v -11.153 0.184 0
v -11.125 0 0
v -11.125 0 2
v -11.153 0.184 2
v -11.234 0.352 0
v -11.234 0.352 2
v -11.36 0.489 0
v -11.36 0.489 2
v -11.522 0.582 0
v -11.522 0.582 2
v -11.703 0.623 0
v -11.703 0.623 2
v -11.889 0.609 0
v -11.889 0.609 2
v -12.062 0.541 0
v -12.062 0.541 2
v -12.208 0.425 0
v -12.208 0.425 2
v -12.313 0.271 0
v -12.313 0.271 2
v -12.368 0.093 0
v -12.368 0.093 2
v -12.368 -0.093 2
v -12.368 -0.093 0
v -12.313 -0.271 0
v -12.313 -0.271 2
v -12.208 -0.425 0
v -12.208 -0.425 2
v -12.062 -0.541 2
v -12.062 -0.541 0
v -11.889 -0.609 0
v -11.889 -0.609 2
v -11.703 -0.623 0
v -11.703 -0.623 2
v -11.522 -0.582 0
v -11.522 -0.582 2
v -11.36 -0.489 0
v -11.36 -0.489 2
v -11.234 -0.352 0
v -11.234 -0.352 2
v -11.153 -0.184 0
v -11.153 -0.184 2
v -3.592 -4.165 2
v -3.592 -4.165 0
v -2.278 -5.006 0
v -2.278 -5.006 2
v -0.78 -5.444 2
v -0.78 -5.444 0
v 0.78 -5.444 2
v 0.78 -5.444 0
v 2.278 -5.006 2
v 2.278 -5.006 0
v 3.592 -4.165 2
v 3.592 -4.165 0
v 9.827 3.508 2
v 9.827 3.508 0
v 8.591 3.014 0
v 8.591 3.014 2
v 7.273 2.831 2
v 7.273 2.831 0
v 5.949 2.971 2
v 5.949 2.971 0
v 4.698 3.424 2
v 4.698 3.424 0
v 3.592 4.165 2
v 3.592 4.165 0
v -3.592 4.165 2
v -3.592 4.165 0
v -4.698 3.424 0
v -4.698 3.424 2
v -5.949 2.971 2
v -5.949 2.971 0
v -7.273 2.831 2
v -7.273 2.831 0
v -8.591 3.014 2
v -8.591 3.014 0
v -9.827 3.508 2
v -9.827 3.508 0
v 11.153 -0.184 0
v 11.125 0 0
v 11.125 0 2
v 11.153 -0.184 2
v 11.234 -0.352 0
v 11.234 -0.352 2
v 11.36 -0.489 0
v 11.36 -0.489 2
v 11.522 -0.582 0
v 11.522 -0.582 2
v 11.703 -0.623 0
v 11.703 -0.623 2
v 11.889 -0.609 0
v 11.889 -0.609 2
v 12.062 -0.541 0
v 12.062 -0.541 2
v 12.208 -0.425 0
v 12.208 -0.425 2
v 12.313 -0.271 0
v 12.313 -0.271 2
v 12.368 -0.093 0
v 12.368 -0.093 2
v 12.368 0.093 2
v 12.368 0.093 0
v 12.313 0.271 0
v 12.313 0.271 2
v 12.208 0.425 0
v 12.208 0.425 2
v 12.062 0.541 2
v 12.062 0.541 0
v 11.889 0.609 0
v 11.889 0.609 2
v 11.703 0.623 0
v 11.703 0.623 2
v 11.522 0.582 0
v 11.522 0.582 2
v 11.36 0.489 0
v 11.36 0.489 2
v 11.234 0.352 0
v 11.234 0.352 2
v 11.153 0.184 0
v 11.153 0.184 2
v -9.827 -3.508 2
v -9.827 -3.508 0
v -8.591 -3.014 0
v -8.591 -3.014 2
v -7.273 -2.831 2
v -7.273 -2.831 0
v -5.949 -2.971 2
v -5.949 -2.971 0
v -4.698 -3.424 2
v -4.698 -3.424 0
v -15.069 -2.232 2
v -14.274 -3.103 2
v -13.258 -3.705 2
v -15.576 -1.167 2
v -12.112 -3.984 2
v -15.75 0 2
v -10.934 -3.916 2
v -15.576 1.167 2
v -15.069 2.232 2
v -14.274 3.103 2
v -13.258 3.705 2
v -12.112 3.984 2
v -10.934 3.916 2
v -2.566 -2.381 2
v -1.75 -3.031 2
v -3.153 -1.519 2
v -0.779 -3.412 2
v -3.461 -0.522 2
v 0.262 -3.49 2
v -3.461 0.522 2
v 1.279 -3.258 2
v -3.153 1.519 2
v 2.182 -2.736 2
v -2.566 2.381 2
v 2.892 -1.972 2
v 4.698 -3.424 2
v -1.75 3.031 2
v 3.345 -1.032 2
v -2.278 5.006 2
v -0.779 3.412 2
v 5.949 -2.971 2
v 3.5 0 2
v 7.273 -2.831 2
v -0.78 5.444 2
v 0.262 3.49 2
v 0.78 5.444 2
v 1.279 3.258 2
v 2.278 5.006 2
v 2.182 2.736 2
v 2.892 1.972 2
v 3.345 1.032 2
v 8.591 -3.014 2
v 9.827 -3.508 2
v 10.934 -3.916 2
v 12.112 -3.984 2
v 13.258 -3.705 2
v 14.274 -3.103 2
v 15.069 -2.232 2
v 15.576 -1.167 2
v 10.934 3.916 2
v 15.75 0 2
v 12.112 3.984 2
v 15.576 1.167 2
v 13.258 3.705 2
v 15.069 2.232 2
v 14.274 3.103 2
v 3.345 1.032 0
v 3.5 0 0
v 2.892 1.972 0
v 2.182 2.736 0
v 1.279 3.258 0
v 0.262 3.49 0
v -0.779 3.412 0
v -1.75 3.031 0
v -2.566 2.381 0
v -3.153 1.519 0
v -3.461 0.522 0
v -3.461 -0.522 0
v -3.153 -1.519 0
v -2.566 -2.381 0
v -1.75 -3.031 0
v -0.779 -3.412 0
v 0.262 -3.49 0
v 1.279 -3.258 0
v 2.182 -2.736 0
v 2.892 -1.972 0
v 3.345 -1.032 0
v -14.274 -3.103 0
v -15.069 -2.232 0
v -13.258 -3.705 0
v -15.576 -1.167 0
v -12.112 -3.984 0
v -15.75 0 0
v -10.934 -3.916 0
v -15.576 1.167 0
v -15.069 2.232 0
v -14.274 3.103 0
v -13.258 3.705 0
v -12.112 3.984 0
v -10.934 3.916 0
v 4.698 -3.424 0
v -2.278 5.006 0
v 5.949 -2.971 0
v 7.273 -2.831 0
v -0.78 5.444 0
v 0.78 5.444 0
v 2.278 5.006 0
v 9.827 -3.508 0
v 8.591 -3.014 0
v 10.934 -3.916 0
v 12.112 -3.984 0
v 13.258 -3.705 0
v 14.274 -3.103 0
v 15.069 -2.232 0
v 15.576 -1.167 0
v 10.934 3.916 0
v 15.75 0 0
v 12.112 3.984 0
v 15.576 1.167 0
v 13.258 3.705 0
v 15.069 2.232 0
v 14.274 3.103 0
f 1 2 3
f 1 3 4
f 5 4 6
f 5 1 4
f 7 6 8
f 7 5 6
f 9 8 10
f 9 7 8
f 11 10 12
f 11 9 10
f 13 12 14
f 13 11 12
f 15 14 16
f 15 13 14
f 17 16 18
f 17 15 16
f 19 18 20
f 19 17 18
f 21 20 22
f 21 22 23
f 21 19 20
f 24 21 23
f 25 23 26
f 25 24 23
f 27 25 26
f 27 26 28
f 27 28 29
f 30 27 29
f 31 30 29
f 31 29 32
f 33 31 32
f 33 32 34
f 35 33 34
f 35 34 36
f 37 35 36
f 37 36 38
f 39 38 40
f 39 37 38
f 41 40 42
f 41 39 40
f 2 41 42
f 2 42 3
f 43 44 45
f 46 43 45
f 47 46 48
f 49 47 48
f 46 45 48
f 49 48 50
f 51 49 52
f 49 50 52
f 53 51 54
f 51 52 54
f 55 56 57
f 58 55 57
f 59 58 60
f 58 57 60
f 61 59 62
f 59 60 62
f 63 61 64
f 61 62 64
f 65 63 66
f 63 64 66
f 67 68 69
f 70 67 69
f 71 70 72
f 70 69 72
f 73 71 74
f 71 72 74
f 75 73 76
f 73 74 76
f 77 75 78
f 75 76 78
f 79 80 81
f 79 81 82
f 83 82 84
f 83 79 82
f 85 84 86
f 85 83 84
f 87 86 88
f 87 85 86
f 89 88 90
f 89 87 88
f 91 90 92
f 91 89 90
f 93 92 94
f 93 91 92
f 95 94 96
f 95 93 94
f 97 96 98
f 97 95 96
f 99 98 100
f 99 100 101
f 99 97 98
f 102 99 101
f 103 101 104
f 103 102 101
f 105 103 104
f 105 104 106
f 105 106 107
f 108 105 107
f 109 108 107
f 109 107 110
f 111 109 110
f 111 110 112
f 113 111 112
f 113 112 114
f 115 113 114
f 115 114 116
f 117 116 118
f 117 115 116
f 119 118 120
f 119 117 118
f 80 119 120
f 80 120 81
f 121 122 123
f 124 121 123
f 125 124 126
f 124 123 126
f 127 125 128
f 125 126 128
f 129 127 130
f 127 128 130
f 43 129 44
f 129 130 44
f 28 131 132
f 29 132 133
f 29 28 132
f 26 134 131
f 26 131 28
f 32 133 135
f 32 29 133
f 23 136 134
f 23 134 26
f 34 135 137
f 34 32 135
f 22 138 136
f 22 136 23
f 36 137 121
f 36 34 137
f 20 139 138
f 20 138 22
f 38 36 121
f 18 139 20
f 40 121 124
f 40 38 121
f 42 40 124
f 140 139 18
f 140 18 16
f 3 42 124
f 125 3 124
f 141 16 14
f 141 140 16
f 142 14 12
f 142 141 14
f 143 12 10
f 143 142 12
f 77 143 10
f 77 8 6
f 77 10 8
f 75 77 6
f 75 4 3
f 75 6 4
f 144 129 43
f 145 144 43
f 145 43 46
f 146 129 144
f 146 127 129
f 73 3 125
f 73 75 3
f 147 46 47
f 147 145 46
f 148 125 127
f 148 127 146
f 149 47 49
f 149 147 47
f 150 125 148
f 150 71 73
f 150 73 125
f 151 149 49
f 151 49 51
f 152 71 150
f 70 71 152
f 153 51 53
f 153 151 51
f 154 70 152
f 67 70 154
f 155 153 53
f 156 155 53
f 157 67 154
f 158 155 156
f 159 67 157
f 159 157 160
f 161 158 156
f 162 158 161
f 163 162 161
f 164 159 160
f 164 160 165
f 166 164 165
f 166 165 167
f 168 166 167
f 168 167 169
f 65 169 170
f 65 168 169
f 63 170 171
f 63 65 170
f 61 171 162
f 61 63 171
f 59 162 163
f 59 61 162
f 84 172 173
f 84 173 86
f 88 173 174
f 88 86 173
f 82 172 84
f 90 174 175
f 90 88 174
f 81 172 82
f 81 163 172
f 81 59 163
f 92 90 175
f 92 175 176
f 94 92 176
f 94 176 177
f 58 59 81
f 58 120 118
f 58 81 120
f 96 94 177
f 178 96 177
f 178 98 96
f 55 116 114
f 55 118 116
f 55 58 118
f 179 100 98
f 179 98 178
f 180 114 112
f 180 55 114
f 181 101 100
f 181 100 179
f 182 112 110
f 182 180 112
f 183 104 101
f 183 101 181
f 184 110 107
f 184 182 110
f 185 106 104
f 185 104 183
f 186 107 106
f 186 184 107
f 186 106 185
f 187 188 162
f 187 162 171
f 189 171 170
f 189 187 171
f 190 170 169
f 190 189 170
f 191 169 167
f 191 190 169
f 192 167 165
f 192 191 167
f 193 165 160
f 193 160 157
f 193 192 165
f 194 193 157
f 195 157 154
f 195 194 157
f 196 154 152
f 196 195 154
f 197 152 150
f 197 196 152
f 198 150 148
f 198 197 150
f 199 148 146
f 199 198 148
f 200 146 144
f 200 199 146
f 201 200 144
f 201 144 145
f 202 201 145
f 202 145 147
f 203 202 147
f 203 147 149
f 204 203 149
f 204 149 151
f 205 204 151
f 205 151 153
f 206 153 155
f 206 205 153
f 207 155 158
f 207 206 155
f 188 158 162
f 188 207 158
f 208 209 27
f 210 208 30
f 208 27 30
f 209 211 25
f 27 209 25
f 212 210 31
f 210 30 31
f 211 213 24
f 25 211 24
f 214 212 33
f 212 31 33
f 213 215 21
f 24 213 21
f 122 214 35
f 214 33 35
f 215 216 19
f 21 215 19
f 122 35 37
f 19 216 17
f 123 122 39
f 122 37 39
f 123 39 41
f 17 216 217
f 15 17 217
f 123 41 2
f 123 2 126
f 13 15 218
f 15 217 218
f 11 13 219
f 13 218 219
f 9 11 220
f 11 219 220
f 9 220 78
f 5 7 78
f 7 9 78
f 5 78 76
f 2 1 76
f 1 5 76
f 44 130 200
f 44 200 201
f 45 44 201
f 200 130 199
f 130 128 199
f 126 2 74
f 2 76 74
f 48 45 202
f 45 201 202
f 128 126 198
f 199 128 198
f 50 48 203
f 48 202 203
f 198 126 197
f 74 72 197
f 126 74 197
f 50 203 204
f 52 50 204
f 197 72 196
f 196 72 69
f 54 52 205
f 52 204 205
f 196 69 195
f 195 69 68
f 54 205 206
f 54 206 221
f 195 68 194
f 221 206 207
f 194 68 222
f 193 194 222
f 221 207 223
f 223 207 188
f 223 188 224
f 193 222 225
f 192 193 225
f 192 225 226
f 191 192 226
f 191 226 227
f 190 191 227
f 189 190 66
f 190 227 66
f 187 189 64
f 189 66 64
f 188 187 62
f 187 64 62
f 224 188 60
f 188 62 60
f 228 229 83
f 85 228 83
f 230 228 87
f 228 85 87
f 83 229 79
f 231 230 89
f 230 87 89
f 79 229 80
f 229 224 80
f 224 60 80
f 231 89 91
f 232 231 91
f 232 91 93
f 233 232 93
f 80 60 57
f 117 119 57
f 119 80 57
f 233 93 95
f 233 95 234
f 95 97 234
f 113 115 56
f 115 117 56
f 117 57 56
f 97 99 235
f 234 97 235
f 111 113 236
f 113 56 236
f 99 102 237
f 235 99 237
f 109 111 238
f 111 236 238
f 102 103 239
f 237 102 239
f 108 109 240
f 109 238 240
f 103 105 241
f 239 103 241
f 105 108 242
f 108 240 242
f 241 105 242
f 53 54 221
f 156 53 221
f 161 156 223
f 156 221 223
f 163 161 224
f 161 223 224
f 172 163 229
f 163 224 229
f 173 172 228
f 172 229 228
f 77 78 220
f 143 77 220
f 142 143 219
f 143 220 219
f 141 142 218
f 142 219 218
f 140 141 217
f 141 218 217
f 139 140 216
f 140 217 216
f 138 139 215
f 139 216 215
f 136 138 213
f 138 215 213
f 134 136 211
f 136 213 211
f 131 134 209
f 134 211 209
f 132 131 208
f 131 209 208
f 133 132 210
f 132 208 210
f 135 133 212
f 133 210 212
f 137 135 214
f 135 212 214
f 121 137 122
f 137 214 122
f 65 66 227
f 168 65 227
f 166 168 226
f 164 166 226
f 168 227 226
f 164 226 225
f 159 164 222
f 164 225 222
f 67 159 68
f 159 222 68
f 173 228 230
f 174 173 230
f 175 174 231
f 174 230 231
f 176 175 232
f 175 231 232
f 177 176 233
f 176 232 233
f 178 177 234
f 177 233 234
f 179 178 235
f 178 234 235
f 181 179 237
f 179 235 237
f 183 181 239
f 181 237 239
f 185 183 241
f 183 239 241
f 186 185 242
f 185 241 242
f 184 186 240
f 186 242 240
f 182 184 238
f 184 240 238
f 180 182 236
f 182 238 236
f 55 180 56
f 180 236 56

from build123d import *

# Parameters (mm, degrees)
SKETCH1_R           = 0.625
SKETCH1_R_2         = 3.5
BOSS_EXTRUDE1_DEPTH = 2


with BuildPart() as part:
    # Sketch1 → Boss-Extrude1 (new body)
    with BuildSketch(Plane.XY):
        with BuildLine():
            ThreePointArc((-9.827267637, 3.507577549), (-15.75, 0), (-9.827267637, -3.507577549))
            ThreePointArc((-9.827267637, -3.507577549), (-6.606615569, -2.860835621), (-3.591755319, -4.165248339))
            ThreePointArc((-3.591755319, -4.165248339), (0, -5.5), (3.591755319, -4.165248339))
            ThreePointArc((3.591755319, -4.165248339), (6.606615569, -2.860835621), (9.827267637, -3.507577549))
            ThreePointArc((9.827267637, -3.507577549), (15.75, 0), (9.827267637, 3.507577549))
            ThreePointArc((9.827267637, 3.507577549), (6.606615569, 2.860835621), (3.591755319, 4.165248339))
            ThreePointArc((3.591755319, 4.165248339), (0, 5.5), (-3.591755319, 4.165248339))
            ThreePointArc((-3.591755319, 4.165248339), (-6.606615569, 2.860835621), (-9.827267637, 3.507577549))
        make_face()
        with Locations((-11.75, 0)):
            Circle(SKETCH1_R, mode=Mode.SUBTRACT)
        Circle(SKETCH1_R_2, mode=Mode.SUBTRACT)
        with Locations(Location((11.75, 0, 0), (0, 0, 180))):
            Circle(SKETCH1_R, mode=Mode.SUBTRACT)
    extrude(amount=BOSS_EXTRUDE1_DEPTH)


solid = part.part
